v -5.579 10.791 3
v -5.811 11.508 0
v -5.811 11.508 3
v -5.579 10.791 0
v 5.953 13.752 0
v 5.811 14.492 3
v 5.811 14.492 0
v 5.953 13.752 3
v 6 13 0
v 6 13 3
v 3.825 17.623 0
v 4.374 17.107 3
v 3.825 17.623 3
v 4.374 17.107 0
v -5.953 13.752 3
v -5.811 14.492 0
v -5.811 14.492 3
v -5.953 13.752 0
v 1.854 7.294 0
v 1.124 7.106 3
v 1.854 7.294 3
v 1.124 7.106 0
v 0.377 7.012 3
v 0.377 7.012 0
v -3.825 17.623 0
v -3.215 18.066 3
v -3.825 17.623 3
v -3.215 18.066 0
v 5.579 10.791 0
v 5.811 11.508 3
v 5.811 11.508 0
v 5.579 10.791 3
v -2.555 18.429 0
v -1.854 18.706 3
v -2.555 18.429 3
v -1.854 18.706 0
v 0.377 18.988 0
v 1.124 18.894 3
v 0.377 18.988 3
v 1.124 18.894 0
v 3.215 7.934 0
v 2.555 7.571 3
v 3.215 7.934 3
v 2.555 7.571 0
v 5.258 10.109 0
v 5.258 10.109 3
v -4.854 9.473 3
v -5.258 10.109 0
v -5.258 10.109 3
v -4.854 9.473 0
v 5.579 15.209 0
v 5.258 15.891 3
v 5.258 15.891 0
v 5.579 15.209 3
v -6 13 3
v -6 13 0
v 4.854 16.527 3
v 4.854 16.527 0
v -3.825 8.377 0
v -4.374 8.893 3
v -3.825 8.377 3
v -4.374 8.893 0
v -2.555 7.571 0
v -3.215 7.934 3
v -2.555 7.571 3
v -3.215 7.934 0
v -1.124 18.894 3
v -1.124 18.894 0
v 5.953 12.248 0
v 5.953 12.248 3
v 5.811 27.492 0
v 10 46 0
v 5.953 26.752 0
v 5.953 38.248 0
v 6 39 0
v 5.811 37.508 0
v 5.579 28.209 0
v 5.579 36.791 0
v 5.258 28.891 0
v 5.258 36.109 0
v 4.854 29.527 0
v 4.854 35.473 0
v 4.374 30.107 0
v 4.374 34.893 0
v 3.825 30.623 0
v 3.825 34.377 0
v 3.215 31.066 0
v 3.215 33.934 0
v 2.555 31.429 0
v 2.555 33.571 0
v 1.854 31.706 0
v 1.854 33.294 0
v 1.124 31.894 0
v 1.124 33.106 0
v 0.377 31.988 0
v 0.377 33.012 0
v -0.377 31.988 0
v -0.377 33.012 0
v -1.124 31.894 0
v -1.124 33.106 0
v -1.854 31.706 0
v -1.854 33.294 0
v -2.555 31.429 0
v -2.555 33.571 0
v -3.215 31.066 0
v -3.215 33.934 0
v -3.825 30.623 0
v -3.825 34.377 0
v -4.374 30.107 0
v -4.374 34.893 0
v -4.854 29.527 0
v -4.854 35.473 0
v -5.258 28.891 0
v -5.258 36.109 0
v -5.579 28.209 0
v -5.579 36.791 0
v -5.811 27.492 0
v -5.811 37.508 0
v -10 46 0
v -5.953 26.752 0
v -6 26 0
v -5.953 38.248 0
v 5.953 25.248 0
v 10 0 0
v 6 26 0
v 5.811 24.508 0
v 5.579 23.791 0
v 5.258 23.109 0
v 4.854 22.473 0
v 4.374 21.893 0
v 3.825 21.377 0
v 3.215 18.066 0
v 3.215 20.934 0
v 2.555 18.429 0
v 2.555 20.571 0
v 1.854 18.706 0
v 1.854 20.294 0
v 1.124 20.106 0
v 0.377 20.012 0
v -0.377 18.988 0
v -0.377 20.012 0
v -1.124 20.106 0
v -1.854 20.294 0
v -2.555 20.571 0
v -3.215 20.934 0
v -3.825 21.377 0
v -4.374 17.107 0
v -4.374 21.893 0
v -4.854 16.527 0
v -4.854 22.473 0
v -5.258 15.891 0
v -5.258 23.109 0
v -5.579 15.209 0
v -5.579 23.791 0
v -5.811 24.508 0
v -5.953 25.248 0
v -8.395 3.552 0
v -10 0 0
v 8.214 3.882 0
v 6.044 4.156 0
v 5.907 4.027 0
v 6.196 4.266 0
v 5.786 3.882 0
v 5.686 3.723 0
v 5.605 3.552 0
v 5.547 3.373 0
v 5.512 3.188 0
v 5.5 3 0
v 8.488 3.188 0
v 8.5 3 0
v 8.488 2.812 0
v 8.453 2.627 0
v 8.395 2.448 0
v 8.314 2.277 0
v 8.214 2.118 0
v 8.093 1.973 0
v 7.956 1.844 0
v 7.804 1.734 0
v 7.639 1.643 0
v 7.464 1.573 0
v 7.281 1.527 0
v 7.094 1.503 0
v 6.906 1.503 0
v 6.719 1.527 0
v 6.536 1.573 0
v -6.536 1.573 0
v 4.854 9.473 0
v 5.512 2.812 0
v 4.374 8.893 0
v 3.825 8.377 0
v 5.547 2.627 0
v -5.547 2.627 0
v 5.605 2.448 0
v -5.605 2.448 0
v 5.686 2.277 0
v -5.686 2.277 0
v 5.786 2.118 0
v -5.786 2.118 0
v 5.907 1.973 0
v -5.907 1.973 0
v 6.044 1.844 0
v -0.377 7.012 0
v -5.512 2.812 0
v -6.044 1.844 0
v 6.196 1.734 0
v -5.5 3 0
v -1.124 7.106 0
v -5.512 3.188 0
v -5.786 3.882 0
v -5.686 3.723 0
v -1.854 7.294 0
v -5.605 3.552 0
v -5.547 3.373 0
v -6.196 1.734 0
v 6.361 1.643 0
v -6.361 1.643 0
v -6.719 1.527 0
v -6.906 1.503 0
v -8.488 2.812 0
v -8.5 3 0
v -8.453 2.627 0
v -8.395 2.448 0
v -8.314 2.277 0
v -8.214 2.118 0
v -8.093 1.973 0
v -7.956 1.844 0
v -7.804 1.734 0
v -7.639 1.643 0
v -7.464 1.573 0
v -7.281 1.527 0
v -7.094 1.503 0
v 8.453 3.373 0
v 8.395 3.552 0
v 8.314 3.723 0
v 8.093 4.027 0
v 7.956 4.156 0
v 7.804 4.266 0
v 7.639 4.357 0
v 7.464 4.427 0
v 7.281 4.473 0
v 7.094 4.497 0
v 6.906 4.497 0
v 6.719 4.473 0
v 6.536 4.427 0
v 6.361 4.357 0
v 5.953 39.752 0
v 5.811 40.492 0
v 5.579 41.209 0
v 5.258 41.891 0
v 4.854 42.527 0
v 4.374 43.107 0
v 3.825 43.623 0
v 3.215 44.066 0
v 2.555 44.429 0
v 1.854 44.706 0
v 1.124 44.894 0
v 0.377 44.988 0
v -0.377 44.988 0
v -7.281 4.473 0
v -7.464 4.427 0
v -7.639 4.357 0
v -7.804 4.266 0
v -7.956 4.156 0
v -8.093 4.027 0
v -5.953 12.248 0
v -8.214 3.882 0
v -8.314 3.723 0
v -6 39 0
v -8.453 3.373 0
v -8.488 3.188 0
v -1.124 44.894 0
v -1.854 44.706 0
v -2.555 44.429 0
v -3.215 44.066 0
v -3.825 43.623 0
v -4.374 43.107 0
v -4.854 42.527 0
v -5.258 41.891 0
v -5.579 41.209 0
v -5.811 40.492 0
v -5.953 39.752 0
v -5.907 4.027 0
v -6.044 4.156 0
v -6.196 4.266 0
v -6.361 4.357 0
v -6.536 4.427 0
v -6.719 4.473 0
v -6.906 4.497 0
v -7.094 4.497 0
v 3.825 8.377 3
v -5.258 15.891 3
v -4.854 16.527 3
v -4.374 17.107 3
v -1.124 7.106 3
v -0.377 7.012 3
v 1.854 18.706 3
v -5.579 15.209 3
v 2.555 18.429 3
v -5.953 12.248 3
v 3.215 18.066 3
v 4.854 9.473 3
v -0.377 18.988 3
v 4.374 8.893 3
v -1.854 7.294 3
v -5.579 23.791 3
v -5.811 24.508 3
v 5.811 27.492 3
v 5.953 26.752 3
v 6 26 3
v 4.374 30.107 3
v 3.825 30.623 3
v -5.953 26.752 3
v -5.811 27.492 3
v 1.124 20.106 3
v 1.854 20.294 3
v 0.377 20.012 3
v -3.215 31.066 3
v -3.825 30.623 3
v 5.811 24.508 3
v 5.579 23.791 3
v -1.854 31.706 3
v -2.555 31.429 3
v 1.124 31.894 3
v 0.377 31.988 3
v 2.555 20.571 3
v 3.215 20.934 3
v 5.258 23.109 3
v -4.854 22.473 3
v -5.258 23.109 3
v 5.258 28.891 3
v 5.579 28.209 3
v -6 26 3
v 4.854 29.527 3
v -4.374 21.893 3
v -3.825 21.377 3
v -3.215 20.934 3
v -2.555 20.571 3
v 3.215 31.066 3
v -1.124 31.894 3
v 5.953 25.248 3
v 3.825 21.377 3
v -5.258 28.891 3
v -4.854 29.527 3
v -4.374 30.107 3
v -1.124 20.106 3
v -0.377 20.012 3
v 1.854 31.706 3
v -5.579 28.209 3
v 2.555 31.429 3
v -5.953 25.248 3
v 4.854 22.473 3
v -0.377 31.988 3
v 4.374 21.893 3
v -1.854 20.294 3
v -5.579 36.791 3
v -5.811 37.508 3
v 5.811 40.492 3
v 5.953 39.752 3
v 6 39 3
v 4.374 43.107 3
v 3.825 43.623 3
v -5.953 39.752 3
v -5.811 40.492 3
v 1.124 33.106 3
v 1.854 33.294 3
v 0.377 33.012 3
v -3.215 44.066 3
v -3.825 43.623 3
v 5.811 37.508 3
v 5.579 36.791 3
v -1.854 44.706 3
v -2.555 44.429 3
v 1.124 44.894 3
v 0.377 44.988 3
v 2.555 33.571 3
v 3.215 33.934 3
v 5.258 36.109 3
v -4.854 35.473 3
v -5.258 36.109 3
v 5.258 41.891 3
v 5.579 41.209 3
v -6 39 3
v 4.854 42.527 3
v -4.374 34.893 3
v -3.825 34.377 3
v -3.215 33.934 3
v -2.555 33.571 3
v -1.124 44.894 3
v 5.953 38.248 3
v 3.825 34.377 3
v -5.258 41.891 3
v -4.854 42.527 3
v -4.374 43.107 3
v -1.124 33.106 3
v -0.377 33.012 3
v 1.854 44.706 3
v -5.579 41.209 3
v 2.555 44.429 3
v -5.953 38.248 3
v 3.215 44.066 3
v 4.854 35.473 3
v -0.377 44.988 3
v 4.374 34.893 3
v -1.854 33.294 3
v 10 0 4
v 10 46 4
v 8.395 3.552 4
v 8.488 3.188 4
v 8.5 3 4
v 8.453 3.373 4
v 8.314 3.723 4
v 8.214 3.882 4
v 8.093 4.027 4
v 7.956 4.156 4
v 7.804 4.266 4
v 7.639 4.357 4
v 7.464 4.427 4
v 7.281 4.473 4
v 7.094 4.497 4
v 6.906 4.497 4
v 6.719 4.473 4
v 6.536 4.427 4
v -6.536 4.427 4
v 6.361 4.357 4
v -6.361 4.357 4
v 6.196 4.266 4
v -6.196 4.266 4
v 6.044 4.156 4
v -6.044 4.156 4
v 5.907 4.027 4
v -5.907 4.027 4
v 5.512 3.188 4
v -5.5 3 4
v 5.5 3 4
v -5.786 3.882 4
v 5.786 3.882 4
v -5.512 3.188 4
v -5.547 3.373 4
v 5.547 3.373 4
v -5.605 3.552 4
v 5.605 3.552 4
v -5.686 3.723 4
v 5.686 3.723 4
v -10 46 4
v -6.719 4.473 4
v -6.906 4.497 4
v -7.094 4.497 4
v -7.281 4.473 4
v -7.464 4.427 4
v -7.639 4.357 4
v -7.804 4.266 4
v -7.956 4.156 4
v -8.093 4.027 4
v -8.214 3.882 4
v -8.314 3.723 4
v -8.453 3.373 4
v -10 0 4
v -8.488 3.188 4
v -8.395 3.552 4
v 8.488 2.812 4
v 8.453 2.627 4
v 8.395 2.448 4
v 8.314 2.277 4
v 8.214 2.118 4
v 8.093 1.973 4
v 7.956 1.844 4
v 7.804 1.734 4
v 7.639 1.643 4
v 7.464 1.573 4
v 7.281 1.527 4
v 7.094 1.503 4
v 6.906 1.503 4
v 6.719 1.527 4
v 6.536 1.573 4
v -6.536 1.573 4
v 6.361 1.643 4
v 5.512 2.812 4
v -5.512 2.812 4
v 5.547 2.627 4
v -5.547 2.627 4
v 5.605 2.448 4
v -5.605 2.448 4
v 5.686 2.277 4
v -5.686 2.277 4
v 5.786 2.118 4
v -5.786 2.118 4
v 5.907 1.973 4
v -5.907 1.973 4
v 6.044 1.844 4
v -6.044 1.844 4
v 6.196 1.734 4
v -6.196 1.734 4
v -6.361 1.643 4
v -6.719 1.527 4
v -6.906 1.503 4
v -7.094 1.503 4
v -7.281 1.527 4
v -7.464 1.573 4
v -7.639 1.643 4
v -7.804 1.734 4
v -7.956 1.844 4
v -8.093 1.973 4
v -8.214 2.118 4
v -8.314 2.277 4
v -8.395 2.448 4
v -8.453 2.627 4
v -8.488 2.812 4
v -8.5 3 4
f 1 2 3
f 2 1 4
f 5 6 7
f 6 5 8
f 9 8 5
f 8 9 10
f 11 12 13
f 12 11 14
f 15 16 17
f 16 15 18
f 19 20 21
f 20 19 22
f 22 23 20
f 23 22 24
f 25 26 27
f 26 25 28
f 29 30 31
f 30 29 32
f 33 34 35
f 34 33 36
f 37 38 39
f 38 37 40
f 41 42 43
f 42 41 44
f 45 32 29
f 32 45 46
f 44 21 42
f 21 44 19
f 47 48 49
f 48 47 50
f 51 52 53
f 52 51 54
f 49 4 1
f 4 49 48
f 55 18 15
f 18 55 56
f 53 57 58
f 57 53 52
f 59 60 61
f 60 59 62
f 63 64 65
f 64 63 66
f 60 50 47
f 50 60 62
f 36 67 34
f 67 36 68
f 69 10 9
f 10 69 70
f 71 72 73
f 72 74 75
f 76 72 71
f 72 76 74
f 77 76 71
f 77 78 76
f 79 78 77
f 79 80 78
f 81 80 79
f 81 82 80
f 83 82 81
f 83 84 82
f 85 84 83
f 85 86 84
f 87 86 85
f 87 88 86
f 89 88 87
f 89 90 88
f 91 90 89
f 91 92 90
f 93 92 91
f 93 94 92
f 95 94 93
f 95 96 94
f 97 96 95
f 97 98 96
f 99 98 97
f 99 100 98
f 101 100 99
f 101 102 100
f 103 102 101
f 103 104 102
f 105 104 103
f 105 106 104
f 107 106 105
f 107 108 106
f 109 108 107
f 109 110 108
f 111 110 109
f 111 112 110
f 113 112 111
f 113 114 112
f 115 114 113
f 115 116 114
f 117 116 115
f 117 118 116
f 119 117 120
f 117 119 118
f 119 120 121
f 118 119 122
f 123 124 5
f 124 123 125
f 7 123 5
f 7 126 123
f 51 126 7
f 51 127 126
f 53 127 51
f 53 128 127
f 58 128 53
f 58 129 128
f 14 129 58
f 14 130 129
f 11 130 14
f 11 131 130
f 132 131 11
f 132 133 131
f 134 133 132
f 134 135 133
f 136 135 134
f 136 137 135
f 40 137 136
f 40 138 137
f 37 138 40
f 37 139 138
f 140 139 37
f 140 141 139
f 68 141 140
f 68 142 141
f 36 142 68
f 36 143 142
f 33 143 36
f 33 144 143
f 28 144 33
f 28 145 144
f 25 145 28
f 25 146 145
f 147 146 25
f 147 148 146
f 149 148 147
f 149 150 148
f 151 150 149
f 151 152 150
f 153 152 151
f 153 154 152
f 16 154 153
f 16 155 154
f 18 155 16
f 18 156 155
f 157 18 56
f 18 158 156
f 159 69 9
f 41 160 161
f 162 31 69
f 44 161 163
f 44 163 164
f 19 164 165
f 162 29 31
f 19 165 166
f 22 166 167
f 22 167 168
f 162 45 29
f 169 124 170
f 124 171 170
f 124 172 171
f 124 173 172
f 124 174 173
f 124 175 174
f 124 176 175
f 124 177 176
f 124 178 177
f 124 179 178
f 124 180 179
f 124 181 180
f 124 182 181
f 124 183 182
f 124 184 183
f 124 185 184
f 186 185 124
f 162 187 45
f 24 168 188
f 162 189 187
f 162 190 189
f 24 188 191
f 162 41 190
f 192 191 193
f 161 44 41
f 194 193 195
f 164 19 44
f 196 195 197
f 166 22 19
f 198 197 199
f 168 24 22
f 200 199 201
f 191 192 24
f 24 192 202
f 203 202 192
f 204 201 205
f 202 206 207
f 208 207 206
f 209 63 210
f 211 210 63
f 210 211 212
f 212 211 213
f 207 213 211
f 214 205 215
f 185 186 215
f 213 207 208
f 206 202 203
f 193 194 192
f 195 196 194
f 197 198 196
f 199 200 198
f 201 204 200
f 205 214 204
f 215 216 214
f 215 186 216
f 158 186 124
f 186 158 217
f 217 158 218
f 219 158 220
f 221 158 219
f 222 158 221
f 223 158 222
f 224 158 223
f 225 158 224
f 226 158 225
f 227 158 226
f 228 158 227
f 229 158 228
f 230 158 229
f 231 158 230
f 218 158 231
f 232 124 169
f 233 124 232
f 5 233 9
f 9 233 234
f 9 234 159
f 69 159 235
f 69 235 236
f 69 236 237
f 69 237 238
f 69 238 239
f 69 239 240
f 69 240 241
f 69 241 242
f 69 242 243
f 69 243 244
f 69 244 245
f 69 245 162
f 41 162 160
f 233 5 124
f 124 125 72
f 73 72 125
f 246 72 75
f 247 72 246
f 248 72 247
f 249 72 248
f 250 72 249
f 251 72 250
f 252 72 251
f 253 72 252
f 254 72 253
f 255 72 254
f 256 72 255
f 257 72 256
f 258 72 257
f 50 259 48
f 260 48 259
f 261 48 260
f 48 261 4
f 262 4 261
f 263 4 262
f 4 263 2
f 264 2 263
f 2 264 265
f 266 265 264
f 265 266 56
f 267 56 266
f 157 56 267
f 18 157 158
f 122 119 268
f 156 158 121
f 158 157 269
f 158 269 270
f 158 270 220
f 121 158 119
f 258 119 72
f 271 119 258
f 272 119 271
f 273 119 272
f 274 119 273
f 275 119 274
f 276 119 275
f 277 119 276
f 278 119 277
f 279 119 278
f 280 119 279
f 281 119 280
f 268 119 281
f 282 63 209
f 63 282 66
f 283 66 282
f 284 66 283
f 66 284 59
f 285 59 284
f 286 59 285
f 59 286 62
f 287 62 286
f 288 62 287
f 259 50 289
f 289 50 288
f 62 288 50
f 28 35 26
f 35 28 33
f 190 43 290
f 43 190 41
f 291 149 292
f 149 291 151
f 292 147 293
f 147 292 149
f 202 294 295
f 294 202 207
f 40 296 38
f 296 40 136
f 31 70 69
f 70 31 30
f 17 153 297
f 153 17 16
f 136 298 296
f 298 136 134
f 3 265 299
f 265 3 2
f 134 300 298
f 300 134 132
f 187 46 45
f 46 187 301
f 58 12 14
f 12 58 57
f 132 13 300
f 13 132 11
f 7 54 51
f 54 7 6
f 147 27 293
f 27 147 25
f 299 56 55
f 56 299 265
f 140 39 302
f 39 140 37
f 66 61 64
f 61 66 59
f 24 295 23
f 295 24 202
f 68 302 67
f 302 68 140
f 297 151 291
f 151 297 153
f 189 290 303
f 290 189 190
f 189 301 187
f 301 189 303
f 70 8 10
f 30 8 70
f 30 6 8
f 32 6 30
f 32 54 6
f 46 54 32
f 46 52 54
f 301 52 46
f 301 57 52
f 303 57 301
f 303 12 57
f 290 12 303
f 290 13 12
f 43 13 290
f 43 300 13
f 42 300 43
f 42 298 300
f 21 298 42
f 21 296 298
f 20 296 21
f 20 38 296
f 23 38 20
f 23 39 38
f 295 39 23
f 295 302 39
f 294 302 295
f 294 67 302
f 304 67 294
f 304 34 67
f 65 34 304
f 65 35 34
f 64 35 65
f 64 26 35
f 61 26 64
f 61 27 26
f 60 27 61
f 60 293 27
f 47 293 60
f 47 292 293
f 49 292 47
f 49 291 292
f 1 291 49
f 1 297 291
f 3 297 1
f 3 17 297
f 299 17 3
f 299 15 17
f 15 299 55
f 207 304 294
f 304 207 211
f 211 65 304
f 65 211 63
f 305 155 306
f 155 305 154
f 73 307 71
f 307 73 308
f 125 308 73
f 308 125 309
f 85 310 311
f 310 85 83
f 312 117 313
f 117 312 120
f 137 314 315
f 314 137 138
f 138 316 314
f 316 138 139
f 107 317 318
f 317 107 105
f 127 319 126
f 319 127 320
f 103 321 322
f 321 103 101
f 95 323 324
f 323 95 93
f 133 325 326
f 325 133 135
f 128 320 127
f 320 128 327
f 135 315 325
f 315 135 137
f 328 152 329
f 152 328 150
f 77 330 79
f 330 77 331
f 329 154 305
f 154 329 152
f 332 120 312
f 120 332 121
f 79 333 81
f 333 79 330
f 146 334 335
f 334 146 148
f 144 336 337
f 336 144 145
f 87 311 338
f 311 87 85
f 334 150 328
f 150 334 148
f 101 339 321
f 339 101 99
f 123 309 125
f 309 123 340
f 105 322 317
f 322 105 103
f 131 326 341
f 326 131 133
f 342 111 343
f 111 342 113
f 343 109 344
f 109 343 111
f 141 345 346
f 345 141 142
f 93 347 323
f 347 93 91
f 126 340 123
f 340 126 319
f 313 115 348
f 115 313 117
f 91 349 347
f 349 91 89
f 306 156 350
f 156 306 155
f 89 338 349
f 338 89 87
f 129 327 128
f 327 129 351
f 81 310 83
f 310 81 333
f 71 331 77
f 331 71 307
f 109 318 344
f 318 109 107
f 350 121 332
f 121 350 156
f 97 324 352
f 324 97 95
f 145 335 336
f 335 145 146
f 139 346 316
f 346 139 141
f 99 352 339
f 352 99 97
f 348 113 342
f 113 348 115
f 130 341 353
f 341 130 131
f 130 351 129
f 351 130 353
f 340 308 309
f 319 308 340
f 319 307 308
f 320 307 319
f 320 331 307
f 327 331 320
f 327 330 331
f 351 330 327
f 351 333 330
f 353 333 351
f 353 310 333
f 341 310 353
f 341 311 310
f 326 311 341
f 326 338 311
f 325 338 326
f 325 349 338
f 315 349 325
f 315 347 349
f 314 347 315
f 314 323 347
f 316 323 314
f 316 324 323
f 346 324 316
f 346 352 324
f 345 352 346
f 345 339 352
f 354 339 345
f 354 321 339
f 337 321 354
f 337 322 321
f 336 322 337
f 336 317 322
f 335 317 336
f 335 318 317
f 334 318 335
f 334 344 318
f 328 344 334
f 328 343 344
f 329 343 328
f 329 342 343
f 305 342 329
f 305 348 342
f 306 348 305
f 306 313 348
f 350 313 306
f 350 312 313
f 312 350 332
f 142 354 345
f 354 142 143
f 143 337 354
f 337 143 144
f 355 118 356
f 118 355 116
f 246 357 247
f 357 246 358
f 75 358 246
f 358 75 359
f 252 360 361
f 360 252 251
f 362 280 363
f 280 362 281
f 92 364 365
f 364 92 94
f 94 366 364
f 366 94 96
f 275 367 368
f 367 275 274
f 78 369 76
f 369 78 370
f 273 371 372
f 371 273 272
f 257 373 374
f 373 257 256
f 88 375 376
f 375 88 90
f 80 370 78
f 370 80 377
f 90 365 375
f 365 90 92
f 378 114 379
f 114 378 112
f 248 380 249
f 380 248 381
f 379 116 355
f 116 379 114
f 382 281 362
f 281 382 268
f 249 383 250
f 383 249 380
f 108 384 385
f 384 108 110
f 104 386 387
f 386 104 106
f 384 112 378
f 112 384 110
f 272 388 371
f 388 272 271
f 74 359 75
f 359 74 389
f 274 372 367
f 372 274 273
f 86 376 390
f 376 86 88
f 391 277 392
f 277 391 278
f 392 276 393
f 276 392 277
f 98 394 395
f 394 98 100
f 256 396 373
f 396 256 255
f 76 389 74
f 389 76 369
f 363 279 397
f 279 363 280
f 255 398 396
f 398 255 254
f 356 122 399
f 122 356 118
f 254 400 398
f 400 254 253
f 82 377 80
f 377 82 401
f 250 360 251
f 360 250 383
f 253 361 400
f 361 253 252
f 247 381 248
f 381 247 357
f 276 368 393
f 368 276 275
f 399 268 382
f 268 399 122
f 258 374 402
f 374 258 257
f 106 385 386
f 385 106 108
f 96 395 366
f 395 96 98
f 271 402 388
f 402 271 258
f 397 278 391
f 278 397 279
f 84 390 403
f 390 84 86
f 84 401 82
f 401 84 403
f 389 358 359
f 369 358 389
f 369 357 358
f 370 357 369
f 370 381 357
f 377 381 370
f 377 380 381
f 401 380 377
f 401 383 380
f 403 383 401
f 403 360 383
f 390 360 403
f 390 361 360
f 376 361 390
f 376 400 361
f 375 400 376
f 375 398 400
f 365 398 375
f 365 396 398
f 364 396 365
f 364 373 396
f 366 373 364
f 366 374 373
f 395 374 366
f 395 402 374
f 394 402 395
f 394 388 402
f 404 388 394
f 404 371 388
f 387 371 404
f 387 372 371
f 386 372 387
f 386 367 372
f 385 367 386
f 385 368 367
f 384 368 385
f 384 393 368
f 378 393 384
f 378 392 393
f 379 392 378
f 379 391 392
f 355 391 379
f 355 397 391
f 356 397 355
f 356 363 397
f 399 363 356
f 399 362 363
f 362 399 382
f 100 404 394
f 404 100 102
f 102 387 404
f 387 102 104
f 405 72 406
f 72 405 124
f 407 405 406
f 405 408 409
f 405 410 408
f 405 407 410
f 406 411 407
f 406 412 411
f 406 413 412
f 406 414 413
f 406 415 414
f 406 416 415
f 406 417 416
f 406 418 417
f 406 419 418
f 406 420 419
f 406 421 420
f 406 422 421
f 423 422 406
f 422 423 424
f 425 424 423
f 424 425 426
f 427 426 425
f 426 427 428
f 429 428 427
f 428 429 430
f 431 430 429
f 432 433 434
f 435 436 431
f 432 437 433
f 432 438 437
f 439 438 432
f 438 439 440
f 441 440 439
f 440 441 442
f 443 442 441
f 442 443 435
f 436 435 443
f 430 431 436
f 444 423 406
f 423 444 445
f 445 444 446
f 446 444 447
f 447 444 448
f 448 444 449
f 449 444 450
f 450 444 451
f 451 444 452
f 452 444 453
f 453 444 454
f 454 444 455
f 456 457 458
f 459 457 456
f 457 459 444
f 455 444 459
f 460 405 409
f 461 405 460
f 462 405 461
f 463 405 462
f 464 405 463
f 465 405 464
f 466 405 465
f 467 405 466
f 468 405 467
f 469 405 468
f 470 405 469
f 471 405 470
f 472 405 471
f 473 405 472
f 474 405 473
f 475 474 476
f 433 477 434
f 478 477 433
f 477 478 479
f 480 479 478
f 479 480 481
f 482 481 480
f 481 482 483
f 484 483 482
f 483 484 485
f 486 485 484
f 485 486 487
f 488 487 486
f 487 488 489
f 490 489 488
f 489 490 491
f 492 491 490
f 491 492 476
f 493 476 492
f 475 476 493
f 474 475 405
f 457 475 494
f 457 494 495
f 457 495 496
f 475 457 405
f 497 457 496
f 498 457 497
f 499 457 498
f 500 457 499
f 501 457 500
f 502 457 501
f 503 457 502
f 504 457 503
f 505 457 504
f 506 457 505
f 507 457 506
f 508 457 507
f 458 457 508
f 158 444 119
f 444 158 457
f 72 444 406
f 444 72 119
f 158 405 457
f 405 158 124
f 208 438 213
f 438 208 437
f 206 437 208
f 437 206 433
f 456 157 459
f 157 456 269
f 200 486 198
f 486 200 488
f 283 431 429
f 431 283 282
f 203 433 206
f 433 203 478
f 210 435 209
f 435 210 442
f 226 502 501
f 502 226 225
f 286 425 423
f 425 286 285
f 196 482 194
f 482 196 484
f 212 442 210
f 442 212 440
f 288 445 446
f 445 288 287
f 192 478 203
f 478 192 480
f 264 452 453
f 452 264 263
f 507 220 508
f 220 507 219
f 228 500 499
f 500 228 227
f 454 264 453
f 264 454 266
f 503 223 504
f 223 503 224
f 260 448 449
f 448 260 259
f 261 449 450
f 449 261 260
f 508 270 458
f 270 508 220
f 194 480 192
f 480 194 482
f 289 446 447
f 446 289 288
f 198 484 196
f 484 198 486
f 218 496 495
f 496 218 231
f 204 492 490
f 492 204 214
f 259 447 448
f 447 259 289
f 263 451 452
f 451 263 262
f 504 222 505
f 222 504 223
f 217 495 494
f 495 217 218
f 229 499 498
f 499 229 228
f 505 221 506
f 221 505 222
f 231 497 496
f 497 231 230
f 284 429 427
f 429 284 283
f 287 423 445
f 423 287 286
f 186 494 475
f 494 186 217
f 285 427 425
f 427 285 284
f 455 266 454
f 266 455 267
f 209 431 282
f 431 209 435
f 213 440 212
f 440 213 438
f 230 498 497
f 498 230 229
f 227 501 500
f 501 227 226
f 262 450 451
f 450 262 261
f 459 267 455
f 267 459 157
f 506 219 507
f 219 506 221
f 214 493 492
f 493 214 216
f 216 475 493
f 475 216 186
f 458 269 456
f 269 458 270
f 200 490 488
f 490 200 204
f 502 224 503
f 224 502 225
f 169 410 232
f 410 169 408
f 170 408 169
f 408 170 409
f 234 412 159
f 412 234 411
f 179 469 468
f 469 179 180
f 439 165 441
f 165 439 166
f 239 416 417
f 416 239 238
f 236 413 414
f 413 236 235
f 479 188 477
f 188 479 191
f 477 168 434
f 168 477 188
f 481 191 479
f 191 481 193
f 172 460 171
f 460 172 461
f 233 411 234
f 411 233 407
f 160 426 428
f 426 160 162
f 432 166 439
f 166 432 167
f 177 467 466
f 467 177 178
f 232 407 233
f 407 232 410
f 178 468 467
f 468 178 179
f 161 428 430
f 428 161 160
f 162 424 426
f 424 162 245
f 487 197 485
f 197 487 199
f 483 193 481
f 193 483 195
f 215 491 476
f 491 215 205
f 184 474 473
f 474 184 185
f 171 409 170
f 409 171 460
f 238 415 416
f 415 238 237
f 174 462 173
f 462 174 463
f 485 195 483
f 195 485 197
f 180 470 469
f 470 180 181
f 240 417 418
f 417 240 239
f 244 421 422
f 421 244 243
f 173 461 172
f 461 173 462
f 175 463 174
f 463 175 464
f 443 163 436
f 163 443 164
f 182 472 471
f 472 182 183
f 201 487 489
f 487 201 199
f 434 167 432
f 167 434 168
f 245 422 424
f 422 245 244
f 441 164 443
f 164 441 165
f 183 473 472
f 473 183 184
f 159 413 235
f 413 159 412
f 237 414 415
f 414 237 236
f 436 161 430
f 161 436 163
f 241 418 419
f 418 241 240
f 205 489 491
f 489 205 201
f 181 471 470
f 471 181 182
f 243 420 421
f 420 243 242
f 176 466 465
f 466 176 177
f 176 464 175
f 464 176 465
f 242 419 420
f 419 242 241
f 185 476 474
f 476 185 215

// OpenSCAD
MOUNT_HOLE_DIA = 3;
MOUNT_HOLE_SPACING = 14;
MOUNT_HOLE_OFFSET = 3;

MAGNET_DIA = 12;
MAGNET_THICKNESS = 3;
MAGNET_SPACING = 13;
MAGNETS = 3;
MAGNETS_OFFSET = 7;

THICKNESS = 4;
WIDTH = 20;
LENGTH = MAGNETS_OFFSET + MAGNETS * MAGNET_SPACING;


$fn = 50;

difference() {
  translate([-WIDTH/2, 0, 0])
  cube(size = [WIDTH, LENGTH, THICKNESS]);

  #translate([-MOUNT_HOLE_SPACING/2, MOUNT_HOLE_OFFSET, 0])
  cylinder(d = MOUNT_HOLE_DIA, h = THICKNESS);

  #translate([MOUNT_HOLE_SPACING/2, MOUNT_HOLE_OFFSET, 0])
  cylinder(d = MOUNT_HOLE_DIA, h = THICKNESS);

  for(i = [0:MAGNETS-1]) {
    #translate([0, MAGNETS_OFFSET + MAGNET_DIA/2 + i * MAGNET_SPACING, 0])
    cylinder(d = MAGNET_DIA, h = MAGNET_THICKNESS);
  }
}
